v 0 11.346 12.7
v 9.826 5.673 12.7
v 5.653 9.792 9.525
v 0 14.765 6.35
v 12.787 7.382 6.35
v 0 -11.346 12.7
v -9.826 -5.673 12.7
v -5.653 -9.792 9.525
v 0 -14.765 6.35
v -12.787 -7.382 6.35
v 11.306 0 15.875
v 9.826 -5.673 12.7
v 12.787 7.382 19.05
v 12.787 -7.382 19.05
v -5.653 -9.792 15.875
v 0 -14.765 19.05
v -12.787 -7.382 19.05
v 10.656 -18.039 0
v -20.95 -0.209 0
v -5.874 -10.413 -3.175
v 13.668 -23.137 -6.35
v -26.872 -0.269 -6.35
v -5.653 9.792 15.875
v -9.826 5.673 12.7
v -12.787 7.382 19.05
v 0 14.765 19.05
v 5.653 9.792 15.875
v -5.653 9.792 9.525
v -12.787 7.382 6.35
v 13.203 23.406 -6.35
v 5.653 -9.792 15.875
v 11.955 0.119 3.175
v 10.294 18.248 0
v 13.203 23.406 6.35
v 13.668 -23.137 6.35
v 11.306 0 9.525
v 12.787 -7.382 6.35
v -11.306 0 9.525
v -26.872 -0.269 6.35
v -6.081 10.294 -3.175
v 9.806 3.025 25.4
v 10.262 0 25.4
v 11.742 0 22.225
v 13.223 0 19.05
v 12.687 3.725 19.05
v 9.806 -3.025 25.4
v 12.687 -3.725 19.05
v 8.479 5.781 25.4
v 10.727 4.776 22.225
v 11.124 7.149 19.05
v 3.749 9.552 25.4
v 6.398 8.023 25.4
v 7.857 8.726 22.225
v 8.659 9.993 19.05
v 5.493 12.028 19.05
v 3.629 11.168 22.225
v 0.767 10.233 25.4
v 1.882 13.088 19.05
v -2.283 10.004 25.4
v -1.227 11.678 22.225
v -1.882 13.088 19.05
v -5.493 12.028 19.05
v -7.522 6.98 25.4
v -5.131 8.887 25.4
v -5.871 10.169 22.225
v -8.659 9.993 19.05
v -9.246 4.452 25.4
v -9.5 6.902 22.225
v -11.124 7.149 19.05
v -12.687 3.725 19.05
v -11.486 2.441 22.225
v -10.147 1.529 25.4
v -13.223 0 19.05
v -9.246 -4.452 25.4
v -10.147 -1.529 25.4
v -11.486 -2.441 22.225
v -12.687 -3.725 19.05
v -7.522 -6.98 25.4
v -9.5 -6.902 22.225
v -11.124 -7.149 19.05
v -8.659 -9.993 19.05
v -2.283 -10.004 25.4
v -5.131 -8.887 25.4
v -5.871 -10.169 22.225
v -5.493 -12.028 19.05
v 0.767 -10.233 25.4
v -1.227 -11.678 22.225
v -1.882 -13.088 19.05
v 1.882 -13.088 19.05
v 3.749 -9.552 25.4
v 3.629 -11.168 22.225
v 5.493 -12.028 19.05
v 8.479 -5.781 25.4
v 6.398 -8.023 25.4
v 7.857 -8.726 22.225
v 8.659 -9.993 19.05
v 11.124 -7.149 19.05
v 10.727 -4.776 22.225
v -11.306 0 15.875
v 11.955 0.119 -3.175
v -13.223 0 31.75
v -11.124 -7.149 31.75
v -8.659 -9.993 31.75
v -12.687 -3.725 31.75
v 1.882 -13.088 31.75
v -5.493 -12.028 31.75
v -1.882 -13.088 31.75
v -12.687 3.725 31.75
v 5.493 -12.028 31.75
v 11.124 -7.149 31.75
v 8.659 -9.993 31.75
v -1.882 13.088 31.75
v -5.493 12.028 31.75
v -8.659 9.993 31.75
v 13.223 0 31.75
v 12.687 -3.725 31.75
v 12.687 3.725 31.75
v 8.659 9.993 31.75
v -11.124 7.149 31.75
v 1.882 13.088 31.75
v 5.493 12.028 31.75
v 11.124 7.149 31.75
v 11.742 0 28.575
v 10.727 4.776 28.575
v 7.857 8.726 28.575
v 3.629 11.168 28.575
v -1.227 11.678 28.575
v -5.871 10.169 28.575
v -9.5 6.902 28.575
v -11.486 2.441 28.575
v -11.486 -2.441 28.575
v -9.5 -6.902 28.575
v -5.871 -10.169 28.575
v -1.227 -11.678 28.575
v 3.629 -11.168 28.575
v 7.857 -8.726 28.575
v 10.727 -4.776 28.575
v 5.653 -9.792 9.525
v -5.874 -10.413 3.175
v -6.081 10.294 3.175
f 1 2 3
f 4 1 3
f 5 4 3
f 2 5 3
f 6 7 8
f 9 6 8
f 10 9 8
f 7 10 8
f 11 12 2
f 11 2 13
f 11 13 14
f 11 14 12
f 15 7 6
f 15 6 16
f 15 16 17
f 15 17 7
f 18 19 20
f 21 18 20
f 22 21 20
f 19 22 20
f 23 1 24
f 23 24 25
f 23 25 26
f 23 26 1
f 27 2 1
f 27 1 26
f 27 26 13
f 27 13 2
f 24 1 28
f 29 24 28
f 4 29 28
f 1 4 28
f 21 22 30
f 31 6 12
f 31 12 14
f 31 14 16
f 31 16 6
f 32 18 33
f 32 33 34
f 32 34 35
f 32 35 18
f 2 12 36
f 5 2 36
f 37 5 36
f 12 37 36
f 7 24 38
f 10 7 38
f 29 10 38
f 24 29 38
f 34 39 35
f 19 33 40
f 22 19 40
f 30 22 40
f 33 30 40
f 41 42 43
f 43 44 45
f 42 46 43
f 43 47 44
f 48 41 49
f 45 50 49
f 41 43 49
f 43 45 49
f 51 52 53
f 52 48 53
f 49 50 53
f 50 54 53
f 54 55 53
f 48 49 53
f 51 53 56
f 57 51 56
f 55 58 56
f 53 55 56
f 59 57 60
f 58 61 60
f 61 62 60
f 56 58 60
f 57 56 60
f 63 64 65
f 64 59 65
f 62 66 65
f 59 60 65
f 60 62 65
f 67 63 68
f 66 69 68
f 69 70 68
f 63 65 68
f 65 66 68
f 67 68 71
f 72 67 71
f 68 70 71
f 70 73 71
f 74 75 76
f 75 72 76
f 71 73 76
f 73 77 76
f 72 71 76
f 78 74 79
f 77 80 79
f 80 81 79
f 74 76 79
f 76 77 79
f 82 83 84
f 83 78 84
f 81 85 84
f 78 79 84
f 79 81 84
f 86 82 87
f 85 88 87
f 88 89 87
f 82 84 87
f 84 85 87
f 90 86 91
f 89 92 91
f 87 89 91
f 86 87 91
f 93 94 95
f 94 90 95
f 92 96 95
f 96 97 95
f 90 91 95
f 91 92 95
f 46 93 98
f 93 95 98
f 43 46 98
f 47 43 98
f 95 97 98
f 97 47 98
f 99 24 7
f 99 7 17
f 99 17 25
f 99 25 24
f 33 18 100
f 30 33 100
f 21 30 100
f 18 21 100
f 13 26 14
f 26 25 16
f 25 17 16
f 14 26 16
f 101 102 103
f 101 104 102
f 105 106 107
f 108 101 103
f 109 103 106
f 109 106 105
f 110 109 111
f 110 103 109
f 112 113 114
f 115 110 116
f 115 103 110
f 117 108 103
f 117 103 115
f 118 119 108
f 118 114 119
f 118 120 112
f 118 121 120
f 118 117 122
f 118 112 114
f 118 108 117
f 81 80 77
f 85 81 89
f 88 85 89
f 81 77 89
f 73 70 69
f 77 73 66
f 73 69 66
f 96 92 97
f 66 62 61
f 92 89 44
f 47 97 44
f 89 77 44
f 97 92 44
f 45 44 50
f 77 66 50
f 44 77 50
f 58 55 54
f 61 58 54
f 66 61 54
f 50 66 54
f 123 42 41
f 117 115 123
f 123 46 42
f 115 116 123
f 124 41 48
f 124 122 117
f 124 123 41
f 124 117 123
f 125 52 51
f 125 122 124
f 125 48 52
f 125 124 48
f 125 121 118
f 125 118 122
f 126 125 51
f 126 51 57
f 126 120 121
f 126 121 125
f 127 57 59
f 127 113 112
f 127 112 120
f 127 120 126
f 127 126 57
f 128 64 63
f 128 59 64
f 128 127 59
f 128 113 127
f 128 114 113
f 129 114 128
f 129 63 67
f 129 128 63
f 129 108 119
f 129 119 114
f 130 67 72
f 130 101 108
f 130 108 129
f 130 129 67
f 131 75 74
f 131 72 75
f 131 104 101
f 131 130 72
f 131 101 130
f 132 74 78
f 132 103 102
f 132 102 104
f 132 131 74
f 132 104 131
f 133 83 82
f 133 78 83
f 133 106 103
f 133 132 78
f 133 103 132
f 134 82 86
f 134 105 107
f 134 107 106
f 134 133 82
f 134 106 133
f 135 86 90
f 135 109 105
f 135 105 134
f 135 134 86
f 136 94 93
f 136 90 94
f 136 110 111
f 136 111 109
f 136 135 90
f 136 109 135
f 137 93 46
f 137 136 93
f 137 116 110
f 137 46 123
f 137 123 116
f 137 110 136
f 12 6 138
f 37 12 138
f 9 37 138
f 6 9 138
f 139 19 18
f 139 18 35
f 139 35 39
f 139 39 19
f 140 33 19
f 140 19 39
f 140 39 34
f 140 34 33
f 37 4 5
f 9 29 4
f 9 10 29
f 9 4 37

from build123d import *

# Parameters (mm, degrees)
F5_DEPTH = 6.35
F5_TAPER = -25
F4_R     = 10.2617339916


with BuildPart() as f5:
    # F2 (on Top) → F5 (new body, symmetric)
    with BuildSketch(Plane.XY):
        Polygon((-20.9499830359, -0.2093548496), (10.6562981361, -18.0385400932), (10.2936848998, 18.2478949428), align=None)
    extrude(amount=F5_DEPTH, both=True, taper=F5_TAPER)


with BuildPart() as f5b:
    # F4 (on offset) → F5, piece 2 (new body, symmetric)
    with BuildSketch(Plane.XY.offset(25.4)):
        Circle(F4_R)
    extrude(amount=F5_DEPTH, both=True, taper=F5_TAPER)


with BuildPart() as f5c:
    # F3 (on offset) → F5, piece 3 (new body, symmetric)
    with BuildSketch(Plane.XY.offset(12.7)):
        Polygon((-9.8257893696, 5.6729221376), (-9.8257893696, -5.6729221376), (0, -11.3458442751), (9.8257893696, -5.6729221376), (9.8257893696, 5.6729221376), (0, 11.3458442751), align=None)
    extrude(amount=F5_DEPTH, both=True, taper=F5_TAPER)


solid = Compound([f5.part, f5b.part, f5c.part])
